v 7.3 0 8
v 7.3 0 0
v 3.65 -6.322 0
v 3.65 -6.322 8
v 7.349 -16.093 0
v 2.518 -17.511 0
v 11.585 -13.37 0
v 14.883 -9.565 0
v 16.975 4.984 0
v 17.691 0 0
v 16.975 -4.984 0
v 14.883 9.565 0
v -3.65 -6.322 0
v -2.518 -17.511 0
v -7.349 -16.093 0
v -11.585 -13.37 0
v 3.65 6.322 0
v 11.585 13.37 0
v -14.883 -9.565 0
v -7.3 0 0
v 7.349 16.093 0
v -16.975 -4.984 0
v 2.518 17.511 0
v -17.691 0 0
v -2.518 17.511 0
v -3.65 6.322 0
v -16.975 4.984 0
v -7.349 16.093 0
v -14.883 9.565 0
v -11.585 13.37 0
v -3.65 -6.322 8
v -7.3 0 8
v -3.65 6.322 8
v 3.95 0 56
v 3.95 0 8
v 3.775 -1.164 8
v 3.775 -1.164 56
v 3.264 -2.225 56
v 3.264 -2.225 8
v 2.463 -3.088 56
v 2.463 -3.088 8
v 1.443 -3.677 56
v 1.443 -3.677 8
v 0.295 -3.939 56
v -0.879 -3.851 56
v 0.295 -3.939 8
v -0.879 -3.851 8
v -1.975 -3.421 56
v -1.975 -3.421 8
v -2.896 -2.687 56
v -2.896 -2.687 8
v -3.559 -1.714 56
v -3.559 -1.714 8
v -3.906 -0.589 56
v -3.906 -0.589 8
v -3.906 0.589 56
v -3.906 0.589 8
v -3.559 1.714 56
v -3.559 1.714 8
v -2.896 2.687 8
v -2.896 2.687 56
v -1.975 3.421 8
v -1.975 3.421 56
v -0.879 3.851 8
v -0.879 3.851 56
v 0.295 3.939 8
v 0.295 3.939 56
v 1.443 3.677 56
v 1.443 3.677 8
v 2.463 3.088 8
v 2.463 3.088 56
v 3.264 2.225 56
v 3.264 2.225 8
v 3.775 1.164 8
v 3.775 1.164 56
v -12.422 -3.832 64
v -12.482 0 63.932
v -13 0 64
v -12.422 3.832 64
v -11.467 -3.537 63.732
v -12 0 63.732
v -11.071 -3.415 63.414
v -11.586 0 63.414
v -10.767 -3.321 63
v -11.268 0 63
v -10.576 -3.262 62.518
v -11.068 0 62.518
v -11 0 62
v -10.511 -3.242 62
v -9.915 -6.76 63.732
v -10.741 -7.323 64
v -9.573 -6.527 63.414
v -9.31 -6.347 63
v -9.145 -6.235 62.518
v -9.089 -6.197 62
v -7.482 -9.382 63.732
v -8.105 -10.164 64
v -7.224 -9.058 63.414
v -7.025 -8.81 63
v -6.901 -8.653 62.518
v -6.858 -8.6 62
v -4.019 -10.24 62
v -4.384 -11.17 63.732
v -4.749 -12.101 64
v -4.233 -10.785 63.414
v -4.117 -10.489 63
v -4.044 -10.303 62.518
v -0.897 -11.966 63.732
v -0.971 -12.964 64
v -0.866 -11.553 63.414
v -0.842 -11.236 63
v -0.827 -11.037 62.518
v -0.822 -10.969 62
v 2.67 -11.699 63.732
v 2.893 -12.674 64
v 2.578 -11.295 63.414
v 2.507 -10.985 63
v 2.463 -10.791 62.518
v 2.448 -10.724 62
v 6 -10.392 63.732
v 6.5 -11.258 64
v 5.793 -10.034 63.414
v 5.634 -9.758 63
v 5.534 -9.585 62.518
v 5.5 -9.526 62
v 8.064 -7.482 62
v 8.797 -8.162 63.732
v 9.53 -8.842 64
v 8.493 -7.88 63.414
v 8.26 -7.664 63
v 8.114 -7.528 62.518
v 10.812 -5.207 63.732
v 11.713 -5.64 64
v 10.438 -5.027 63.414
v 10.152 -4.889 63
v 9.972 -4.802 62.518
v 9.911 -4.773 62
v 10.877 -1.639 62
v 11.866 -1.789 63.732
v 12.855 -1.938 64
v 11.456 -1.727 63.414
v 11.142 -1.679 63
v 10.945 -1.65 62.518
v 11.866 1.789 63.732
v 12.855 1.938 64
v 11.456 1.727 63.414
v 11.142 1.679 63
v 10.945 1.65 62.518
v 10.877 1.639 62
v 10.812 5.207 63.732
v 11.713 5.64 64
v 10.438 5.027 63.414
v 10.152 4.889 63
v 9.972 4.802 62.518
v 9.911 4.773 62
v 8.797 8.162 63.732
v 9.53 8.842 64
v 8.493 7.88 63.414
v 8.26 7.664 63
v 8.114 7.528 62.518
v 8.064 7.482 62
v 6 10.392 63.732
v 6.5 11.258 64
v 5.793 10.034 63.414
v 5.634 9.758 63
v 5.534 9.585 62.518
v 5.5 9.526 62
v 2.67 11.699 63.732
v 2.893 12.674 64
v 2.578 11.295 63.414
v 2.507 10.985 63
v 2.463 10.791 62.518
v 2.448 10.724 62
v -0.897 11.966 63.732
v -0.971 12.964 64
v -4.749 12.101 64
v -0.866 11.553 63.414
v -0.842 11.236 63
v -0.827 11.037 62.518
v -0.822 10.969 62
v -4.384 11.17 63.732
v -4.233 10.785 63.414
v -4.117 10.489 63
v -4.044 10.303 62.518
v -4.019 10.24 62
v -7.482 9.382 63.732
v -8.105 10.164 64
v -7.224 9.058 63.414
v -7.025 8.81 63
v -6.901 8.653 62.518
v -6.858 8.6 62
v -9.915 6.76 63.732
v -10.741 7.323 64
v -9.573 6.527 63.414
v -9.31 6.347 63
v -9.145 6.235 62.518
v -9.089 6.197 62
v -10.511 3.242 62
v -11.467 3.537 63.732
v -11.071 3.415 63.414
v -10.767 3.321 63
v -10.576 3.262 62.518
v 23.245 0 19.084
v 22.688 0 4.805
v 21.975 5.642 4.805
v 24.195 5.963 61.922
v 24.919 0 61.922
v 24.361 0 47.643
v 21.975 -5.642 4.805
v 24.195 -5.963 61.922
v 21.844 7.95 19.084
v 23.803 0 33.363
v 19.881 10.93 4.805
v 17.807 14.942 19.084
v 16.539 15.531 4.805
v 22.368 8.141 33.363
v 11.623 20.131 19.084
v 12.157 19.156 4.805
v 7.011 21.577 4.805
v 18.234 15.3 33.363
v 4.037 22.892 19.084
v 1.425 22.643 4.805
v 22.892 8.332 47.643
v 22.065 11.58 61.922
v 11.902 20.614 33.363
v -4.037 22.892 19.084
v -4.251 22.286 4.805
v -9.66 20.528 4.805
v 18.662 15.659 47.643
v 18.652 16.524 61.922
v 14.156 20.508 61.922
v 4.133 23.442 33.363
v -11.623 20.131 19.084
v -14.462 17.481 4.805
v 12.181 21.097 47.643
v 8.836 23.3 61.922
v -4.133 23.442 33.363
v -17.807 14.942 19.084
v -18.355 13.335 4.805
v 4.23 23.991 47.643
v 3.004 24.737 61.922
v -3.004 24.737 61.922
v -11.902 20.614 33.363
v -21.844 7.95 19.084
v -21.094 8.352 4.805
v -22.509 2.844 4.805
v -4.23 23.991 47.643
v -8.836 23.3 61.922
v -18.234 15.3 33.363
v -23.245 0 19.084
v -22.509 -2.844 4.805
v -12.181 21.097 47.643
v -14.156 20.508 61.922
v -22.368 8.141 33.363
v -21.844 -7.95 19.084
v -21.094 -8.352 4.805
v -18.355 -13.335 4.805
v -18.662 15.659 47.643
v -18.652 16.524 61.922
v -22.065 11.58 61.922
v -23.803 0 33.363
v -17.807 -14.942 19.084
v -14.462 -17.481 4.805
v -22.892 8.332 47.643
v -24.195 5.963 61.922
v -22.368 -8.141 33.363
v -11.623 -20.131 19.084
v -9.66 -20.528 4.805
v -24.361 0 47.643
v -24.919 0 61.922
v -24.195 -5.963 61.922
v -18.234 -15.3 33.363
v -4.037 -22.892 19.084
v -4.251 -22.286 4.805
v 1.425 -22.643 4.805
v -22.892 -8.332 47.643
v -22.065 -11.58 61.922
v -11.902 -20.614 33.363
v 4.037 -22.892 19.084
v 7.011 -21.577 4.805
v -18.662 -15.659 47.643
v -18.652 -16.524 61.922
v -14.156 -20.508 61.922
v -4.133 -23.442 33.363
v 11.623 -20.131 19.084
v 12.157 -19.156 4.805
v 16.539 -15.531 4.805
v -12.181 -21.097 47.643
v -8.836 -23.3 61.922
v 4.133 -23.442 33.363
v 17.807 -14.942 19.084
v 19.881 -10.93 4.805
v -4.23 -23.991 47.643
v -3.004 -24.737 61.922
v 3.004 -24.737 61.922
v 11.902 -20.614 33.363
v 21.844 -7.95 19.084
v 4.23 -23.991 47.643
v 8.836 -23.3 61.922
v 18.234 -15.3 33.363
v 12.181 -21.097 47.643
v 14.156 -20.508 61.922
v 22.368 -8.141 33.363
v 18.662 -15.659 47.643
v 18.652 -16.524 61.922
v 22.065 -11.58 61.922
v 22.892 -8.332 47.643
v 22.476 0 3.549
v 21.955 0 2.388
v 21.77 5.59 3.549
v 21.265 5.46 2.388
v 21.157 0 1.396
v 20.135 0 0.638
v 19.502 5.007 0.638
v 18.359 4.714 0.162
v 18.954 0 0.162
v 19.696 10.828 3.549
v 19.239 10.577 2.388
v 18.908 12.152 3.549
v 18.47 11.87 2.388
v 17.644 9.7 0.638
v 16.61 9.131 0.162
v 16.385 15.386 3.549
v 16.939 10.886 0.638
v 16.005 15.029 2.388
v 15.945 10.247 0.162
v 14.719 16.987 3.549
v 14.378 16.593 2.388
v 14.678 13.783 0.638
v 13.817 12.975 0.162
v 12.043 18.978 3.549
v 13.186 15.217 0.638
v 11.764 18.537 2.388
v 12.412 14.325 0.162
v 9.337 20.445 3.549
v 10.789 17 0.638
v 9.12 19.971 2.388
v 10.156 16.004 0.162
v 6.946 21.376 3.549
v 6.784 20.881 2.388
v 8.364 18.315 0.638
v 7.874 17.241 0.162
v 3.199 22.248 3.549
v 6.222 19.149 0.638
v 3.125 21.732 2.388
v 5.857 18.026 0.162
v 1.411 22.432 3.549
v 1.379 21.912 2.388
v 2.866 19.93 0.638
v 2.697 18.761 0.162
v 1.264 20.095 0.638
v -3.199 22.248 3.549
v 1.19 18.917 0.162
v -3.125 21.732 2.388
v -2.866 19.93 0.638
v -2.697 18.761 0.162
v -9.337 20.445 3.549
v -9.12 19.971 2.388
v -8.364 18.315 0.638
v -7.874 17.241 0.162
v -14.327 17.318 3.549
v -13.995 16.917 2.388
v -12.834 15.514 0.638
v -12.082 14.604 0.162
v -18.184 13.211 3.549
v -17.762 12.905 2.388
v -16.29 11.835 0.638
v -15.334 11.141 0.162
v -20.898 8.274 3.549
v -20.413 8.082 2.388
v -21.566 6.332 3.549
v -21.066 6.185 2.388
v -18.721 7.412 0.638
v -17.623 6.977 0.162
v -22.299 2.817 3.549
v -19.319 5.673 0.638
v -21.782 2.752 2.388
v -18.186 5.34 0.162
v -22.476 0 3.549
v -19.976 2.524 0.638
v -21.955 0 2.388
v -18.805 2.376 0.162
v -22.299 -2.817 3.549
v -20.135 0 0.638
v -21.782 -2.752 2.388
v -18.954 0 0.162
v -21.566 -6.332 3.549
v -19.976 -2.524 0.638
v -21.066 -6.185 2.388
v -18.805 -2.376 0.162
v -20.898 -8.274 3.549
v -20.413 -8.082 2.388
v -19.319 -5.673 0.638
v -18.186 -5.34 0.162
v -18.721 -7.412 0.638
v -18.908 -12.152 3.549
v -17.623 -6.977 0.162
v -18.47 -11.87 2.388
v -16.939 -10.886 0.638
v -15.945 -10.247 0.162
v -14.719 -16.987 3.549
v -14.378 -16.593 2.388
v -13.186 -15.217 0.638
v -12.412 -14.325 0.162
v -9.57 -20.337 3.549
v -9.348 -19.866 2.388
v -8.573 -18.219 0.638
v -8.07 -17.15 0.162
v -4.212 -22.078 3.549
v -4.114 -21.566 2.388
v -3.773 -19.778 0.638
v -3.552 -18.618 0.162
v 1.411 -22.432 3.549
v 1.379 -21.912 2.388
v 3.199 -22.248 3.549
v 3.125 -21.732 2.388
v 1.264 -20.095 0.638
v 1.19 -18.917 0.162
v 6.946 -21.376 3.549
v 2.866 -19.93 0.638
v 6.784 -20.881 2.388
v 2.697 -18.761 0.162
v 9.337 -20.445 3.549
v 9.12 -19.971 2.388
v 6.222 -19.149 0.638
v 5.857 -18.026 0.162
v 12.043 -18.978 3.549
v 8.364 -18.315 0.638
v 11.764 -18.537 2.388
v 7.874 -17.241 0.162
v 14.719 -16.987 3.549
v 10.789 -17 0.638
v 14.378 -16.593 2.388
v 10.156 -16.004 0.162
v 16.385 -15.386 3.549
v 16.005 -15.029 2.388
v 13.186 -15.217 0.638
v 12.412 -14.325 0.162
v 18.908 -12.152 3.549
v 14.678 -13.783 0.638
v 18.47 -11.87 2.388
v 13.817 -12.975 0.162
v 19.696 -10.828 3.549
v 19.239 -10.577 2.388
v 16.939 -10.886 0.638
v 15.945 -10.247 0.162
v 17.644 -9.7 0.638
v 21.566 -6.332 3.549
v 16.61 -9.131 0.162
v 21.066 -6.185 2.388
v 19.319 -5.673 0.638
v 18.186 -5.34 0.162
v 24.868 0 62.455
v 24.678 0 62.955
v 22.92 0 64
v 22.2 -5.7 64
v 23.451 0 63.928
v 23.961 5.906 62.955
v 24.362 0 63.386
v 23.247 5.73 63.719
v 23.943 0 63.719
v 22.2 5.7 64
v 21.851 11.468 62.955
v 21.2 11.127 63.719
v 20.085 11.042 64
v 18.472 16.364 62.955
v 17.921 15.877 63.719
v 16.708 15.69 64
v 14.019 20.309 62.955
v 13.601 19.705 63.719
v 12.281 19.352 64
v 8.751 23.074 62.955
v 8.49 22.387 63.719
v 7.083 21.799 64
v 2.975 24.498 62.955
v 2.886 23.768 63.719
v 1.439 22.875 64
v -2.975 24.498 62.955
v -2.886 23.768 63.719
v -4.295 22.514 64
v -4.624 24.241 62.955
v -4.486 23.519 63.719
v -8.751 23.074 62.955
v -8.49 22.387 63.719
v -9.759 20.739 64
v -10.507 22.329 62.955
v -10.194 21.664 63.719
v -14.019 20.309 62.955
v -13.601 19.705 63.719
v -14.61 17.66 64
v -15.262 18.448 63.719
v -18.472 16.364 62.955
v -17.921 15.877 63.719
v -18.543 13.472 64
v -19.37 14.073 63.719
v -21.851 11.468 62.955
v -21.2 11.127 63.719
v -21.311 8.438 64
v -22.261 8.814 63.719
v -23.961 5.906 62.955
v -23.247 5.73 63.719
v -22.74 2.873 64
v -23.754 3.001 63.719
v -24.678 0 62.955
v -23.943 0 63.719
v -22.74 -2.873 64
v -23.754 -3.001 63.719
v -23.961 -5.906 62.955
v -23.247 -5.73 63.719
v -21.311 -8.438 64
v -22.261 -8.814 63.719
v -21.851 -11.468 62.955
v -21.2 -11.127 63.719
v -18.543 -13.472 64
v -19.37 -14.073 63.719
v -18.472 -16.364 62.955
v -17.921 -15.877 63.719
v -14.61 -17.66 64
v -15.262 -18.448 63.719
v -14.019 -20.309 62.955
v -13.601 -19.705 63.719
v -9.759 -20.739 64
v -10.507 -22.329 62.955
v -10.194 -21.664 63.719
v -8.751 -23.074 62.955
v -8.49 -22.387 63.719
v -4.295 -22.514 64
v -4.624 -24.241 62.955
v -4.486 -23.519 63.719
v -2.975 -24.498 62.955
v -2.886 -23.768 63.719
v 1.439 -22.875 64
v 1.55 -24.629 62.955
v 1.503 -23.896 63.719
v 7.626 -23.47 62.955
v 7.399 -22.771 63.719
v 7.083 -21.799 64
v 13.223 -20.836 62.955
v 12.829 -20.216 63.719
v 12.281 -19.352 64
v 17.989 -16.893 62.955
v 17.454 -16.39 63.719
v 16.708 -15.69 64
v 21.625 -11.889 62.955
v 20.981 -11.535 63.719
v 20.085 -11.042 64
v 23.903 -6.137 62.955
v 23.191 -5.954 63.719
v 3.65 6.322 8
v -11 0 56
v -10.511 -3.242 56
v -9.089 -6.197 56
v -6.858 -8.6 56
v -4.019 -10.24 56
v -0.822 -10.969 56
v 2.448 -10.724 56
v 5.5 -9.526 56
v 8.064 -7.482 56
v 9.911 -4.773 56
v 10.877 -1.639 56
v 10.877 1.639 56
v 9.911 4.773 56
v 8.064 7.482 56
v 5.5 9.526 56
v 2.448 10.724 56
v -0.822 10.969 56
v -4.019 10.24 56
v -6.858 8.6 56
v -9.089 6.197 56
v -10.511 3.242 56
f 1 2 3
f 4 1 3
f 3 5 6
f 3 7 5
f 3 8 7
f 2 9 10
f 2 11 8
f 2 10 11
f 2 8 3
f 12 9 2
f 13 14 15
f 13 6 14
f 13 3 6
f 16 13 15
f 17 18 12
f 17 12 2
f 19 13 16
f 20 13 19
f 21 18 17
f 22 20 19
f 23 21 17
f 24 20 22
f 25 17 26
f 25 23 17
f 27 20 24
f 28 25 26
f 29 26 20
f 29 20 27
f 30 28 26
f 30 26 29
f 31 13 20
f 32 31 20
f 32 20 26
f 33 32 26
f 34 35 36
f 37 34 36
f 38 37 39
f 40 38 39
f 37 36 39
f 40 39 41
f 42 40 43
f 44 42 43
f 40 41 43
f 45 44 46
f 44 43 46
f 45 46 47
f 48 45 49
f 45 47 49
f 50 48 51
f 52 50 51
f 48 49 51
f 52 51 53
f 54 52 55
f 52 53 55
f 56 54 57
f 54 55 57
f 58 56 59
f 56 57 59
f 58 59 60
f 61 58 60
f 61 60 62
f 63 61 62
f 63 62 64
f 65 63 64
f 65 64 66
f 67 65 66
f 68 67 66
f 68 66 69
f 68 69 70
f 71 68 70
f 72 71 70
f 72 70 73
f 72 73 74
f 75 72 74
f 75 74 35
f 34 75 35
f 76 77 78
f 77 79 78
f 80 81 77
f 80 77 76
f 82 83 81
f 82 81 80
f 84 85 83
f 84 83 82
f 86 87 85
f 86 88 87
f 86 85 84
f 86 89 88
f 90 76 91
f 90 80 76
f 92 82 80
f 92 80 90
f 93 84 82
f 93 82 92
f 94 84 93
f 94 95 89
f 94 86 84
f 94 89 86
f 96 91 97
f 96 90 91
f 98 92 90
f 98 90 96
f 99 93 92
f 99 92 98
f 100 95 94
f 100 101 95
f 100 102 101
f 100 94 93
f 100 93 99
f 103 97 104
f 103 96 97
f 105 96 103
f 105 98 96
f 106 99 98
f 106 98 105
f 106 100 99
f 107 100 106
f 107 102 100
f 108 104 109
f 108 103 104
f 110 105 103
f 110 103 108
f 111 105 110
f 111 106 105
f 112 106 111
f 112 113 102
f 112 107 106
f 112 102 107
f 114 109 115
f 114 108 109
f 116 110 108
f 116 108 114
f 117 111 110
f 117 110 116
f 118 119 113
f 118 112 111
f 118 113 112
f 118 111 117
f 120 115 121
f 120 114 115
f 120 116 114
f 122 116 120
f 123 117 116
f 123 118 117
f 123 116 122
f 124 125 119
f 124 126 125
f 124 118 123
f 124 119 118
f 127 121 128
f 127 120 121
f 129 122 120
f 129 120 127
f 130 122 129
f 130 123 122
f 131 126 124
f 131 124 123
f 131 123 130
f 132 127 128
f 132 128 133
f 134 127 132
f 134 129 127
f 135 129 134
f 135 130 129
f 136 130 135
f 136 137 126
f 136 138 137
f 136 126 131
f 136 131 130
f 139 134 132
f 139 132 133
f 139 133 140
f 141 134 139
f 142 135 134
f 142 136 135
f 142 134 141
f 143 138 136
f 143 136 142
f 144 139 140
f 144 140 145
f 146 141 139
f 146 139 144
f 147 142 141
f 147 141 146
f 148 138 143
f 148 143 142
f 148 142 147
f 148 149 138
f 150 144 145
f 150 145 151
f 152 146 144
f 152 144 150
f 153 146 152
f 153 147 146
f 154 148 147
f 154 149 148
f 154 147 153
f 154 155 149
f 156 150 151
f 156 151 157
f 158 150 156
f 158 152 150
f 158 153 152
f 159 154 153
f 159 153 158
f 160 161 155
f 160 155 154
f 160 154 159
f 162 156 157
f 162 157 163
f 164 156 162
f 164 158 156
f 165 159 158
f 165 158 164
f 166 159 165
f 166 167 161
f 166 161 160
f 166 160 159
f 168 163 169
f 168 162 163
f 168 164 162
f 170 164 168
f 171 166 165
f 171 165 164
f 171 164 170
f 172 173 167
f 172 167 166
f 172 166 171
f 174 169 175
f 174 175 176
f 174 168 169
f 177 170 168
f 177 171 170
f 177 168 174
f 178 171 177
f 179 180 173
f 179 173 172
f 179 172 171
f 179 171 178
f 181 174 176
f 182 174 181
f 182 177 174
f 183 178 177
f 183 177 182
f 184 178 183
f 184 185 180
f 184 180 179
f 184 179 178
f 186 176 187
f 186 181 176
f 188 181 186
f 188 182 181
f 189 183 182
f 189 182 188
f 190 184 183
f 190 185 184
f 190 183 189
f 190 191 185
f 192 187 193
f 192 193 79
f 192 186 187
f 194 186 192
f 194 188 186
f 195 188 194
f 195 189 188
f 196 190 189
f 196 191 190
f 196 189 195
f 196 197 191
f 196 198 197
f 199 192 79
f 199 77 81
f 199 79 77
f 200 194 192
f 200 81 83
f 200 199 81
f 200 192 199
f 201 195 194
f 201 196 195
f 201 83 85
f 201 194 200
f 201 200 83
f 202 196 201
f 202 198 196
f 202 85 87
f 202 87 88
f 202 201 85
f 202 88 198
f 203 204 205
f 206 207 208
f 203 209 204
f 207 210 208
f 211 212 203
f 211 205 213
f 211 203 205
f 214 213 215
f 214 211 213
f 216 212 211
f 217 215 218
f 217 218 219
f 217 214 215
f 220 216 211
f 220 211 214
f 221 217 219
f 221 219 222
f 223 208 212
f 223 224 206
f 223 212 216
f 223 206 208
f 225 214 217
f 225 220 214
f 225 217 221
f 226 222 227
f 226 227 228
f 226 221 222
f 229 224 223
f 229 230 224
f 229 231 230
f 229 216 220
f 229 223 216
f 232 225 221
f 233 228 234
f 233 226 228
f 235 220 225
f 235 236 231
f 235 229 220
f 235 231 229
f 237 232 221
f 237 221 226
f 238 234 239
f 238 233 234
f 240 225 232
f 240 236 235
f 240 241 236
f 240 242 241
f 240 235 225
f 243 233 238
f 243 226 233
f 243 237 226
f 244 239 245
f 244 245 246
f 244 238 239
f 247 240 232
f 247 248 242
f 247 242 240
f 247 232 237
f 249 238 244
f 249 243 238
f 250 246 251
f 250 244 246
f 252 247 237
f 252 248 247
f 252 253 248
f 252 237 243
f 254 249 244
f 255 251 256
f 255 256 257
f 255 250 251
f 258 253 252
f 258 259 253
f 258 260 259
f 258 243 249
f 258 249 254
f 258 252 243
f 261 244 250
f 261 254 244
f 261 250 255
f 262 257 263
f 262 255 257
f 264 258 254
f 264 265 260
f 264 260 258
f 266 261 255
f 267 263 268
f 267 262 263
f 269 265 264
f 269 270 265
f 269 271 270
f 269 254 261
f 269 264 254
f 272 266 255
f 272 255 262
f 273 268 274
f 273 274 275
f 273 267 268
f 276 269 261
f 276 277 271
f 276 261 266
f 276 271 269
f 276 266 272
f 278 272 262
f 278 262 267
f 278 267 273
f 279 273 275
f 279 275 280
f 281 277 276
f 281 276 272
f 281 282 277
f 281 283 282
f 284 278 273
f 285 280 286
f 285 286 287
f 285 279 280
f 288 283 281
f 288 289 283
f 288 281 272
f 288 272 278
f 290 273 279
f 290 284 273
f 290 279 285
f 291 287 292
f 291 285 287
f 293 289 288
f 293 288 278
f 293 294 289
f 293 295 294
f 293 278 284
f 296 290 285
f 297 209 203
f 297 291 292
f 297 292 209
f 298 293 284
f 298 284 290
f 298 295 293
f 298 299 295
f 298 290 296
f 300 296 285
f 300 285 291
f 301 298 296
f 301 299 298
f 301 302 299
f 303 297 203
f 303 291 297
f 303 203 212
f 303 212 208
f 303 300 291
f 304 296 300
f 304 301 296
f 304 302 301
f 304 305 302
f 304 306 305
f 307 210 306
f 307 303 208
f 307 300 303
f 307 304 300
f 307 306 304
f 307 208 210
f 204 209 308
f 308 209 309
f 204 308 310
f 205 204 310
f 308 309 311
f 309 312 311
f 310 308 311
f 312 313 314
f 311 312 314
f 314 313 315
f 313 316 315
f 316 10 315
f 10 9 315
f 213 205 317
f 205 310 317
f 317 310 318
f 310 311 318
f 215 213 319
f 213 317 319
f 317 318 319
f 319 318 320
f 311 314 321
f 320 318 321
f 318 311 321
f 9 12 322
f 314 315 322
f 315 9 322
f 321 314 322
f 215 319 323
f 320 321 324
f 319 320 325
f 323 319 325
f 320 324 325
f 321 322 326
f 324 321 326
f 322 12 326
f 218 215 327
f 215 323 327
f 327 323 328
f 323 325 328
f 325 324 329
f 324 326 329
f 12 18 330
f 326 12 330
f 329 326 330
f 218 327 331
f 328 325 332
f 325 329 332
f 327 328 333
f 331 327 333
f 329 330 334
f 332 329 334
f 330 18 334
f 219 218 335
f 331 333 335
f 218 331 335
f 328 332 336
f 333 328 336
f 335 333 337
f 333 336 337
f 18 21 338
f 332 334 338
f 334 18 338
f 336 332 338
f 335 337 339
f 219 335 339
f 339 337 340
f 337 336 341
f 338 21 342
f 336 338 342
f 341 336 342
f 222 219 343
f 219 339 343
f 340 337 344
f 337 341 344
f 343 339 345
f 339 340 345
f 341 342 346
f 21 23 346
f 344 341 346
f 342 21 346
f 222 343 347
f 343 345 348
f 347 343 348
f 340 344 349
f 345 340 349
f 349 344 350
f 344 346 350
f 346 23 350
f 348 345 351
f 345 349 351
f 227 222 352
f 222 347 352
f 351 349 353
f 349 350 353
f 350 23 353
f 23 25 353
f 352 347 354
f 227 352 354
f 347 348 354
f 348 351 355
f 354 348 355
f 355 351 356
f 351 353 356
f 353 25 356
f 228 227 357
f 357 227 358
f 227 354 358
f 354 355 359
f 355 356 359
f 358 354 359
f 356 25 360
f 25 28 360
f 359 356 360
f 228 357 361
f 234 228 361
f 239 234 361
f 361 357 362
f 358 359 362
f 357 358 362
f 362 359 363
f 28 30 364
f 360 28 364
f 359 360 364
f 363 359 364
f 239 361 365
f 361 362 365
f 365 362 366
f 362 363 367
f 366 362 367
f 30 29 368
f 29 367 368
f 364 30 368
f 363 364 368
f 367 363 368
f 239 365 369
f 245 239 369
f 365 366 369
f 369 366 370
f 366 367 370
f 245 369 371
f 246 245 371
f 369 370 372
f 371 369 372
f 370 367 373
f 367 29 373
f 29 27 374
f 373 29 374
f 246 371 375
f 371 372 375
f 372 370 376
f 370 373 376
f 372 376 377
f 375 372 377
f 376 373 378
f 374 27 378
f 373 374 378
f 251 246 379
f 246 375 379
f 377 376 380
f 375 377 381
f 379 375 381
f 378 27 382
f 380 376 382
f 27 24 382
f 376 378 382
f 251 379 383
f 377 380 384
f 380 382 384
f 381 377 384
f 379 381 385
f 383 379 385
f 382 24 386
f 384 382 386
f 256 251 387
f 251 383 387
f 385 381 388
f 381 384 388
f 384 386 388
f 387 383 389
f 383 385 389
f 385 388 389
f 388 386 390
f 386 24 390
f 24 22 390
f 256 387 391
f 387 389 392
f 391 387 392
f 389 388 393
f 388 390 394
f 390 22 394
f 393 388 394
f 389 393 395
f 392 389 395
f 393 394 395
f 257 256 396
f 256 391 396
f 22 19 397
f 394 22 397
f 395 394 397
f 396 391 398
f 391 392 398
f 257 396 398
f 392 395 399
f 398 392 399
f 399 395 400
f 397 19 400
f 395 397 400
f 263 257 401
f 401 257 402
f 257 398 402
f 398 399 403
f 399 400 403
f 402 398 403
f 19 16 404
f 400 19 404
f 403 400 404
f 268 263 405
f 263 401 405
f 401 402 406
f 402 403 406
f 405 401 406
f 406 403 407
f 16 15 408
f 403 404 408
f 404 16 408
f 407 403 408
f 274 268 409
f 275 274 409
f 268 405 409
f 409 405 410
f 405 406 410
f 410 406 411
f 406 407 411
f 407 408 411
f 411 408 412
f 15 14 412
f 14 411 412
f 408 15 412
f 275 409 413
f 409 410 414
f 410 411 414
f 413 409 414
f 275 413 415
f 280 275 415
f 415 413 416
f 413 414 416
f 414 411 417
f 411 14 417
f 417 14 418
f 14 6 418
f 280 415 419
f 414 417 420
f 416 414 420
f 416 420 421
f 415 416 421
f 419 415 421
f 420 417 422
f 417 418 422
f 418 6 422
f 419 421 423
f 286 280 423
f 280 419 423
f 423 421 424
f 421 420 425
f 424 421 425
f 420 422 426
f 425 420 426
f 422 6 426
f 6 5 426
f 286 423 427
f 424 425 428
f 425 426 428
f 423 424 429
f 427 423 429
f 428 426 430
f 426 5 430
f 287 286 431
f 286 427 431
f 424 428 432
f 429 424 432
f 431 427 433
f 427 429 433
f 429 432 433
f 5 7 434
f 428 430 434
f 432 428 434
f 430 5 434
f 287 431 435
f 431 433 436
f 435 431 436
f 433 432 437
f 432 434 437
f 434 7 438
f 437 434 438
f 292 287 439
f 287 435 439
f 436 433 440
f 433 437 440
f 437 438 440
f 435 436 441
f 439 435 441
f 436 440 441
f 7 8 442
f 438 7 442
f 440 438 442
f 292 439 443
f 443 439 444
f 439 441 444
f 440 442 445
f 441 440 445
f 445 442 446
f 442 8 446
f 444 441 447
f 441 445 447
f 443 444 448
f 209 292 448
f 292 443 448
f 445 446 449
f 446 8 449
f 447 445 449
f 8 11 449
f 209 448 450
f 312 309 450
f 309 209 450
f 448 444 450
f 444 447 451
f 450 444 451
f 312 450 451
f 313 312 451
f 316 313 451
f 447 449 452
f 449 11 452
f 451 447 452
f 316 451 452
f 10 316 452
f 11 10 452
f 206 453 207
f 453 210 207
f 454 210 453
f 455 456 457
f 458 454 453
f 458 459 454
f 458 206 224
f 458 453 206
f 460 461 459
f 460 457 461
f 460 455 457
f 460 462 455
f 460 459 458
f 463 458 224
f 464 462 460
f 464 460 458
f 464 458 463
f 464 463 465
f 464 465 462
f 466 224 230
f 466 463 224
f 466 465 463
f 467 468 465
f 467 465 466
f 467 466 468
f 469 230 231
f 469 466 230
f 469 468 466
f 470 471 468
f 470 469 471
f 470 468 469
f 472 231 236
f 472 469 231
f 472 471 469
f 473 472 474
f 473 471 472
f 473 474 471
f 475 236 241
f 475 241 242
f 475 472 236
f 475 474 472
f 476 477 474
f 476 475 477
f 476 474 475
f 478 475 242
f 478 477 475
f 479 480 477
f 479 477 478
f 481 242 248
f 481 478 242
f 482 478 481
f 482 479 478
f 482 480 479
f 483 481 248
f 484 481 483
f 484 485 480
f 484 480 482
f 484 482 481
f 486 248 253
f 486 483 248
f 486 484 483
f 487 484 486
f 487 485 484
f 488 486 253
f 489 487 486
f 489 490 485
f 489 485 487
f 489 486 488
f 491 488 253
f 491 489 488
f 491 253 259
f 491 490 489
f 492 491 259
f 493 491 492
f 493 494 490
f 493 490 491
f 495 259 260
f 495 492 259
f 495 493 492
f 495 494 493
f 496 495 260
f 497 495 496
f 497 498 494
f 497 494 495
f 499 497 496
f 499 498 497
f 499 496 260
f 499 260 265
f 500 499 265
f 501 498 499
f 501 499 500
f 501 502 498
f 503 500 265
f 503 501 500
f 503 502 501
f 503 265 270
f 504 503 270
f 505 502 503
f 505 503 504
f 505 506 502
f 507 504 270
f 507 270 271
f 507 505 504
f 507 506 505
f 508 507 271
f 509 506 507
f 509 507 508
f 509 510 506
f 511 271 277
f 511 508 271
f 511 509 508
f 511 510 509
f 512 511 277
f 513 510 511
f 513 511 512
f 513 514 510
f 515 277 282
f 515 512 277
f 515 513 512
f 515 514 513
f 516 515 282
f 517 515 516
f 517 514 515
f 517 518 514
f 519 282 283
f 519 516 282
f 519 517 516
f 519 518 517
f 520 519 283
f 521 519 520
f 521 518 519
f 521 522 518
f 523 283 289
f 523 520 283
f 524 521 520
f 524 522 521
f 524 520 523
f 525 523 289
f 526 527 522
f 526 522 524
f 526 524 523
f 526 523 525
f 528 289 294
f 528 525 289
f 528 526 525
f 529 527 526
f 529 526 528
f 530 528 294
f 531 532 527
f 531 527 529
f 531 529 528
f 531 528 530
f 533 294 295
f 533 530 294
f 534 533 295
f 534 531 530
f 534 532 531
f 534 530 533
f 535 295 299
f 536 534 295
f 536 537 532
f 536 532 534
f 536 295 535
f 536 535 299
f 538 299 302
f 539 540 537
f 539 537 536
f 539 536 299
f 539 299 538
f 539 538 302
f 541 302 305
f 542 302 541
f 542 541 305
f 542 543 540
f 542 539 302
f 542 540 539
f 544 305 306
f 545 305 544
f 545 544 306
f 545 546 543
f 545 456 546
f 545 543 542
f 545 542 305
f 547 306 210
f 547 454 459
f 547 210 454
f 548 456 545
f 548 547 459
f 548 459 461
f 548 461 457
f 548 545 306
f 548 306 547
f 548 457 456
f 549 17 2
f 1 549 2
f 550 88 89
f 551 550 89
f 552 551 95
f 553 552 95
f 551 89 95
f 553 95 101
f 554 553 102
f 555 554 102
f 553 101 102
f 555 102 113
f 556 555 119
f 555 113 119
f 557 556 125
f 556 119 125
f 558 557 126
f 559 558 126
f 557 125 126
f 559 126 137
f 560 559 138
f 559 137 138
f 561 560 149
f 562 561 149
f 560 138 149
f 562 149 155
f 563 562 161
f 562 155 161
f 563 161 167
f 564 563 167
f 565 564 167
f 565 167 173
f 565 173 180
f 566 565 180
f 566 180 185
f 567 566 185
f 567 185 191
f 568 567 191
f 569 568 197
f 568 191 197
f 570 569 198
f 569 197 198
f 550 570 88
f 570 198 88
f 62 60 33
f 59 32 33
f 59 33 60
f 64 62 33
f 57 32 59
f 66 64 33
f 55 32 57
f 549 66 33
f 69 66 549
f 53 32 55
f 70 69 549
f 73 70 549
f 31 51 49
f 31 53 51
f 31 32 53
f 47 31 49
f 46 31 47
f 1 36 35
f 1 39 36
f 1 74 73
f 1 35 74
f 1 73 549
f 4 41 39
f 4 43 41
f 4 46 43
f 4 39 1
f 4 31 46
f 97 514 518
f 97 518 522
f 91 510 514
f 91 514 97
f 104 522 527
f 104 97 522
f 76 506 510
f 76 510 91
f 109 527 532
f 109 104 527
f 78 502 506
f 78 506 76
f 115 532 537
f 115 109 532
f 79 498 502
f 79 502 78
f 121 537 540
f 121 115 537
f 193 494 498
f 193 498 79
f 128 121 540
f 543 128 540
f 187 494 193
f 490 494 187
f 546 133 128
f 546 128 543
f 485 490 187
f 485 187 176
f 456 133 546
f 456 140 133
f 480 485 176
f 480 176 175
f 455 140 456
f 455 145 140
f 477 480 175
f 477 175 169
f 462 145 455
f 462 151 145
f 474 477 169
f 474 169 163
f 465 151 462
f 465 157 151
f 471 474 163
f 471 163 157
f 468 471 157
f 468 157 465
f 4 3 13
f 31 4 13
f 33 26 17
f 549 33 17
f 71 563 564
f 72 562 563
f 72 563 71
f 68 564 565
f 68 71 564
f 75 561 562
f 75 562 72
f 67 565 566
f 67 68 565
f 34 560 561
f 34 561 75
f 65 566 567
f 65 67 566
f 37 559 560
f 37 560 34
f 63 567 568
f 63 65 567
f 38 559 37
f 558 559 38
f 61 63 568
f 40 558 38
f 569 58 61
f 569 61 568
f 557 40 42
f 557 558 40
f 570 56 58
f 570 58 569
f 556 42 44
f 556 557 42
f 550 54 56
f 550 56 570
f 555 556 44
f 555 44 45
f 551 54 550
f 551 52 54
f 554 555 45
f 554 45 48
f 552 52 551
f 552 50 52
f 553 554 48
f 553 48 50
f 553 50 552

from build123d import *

# Parameters (mm, degrees)
POCKET_DEPTH    = 8
SKETCH003_R     = 3.95
POCKET001_DEPTH = 64.001
SKETCH004_R     = 11
POCKET002_DEPTH = 8
FILLET_R        = 2
FILLET001_R     = 5


with BuildPart() as part:
    # Sketch → Revolution (revolve)
    with BuildSketch(Plane.XZ):
        Polygon((0, 0), (22.5, 0), (25, 64), (0, 64), align=None)
    revolve(axis=Axis((0, 0, 0), (0, 0, 1)))

    # Sketch002 (on Face1 of Revolution) → Pocket (cut)
    with BuildSketch(Plane(origin=(0, 0, 0), x_dir=(1, 0, 0), z_dir=(0, 0, -1))):
        Polygon((7.3, 0), (3.65, 6.321985), (-3.65, 6.321985), (-7.3, 0), (-3.65, -6.321985), (3.65, -6.321985), align=None)
    extrude(amount=-POCKET_DEPTH, mode=Mode.SUBTRACT)

    # Sketch003 (on Face1 of Pocket) → Pocket001 (cut, through all)
    with BuildSketch(Plane(origin=(0, 0, 0), x_dir=(1, 0, 0), z_dir=(0, 0, -1))):
        Circle(SKETCH003_R)
    extrude(amount=-POCKET001_DEPTH, mode=Mode.SUBTRACT)

    # Sketch004 (on Face9 of Pocket001) → Pocket002 (cut)
    with BuildSketch(Plane(origin=(0, 0, 64), x_dir=(-1, 0, 0), z_dir=(0, 0, 1))):
        Circle(SKETCH004_R)
    extrude(amount=-POCKET002_DEPTH, mode=Mode.SUBTRACT)

    # Fillet
    fillet_edges = [part.edges().sort_by_distance(p)[0] for p in [
        (-25, 0, 64),
        (11, 0, 64),
    ]]
    fillet(fillet_edges, radius=FILLET_R)

    # Fillet001
    fillet001_edges = [part.edges().sort_by_distance(p)[0] for p in [
        (-22.5, 0, 0),
    ]]
    fillet(fillet001_edges, radius=FILLET001_R)


solid = part.part
